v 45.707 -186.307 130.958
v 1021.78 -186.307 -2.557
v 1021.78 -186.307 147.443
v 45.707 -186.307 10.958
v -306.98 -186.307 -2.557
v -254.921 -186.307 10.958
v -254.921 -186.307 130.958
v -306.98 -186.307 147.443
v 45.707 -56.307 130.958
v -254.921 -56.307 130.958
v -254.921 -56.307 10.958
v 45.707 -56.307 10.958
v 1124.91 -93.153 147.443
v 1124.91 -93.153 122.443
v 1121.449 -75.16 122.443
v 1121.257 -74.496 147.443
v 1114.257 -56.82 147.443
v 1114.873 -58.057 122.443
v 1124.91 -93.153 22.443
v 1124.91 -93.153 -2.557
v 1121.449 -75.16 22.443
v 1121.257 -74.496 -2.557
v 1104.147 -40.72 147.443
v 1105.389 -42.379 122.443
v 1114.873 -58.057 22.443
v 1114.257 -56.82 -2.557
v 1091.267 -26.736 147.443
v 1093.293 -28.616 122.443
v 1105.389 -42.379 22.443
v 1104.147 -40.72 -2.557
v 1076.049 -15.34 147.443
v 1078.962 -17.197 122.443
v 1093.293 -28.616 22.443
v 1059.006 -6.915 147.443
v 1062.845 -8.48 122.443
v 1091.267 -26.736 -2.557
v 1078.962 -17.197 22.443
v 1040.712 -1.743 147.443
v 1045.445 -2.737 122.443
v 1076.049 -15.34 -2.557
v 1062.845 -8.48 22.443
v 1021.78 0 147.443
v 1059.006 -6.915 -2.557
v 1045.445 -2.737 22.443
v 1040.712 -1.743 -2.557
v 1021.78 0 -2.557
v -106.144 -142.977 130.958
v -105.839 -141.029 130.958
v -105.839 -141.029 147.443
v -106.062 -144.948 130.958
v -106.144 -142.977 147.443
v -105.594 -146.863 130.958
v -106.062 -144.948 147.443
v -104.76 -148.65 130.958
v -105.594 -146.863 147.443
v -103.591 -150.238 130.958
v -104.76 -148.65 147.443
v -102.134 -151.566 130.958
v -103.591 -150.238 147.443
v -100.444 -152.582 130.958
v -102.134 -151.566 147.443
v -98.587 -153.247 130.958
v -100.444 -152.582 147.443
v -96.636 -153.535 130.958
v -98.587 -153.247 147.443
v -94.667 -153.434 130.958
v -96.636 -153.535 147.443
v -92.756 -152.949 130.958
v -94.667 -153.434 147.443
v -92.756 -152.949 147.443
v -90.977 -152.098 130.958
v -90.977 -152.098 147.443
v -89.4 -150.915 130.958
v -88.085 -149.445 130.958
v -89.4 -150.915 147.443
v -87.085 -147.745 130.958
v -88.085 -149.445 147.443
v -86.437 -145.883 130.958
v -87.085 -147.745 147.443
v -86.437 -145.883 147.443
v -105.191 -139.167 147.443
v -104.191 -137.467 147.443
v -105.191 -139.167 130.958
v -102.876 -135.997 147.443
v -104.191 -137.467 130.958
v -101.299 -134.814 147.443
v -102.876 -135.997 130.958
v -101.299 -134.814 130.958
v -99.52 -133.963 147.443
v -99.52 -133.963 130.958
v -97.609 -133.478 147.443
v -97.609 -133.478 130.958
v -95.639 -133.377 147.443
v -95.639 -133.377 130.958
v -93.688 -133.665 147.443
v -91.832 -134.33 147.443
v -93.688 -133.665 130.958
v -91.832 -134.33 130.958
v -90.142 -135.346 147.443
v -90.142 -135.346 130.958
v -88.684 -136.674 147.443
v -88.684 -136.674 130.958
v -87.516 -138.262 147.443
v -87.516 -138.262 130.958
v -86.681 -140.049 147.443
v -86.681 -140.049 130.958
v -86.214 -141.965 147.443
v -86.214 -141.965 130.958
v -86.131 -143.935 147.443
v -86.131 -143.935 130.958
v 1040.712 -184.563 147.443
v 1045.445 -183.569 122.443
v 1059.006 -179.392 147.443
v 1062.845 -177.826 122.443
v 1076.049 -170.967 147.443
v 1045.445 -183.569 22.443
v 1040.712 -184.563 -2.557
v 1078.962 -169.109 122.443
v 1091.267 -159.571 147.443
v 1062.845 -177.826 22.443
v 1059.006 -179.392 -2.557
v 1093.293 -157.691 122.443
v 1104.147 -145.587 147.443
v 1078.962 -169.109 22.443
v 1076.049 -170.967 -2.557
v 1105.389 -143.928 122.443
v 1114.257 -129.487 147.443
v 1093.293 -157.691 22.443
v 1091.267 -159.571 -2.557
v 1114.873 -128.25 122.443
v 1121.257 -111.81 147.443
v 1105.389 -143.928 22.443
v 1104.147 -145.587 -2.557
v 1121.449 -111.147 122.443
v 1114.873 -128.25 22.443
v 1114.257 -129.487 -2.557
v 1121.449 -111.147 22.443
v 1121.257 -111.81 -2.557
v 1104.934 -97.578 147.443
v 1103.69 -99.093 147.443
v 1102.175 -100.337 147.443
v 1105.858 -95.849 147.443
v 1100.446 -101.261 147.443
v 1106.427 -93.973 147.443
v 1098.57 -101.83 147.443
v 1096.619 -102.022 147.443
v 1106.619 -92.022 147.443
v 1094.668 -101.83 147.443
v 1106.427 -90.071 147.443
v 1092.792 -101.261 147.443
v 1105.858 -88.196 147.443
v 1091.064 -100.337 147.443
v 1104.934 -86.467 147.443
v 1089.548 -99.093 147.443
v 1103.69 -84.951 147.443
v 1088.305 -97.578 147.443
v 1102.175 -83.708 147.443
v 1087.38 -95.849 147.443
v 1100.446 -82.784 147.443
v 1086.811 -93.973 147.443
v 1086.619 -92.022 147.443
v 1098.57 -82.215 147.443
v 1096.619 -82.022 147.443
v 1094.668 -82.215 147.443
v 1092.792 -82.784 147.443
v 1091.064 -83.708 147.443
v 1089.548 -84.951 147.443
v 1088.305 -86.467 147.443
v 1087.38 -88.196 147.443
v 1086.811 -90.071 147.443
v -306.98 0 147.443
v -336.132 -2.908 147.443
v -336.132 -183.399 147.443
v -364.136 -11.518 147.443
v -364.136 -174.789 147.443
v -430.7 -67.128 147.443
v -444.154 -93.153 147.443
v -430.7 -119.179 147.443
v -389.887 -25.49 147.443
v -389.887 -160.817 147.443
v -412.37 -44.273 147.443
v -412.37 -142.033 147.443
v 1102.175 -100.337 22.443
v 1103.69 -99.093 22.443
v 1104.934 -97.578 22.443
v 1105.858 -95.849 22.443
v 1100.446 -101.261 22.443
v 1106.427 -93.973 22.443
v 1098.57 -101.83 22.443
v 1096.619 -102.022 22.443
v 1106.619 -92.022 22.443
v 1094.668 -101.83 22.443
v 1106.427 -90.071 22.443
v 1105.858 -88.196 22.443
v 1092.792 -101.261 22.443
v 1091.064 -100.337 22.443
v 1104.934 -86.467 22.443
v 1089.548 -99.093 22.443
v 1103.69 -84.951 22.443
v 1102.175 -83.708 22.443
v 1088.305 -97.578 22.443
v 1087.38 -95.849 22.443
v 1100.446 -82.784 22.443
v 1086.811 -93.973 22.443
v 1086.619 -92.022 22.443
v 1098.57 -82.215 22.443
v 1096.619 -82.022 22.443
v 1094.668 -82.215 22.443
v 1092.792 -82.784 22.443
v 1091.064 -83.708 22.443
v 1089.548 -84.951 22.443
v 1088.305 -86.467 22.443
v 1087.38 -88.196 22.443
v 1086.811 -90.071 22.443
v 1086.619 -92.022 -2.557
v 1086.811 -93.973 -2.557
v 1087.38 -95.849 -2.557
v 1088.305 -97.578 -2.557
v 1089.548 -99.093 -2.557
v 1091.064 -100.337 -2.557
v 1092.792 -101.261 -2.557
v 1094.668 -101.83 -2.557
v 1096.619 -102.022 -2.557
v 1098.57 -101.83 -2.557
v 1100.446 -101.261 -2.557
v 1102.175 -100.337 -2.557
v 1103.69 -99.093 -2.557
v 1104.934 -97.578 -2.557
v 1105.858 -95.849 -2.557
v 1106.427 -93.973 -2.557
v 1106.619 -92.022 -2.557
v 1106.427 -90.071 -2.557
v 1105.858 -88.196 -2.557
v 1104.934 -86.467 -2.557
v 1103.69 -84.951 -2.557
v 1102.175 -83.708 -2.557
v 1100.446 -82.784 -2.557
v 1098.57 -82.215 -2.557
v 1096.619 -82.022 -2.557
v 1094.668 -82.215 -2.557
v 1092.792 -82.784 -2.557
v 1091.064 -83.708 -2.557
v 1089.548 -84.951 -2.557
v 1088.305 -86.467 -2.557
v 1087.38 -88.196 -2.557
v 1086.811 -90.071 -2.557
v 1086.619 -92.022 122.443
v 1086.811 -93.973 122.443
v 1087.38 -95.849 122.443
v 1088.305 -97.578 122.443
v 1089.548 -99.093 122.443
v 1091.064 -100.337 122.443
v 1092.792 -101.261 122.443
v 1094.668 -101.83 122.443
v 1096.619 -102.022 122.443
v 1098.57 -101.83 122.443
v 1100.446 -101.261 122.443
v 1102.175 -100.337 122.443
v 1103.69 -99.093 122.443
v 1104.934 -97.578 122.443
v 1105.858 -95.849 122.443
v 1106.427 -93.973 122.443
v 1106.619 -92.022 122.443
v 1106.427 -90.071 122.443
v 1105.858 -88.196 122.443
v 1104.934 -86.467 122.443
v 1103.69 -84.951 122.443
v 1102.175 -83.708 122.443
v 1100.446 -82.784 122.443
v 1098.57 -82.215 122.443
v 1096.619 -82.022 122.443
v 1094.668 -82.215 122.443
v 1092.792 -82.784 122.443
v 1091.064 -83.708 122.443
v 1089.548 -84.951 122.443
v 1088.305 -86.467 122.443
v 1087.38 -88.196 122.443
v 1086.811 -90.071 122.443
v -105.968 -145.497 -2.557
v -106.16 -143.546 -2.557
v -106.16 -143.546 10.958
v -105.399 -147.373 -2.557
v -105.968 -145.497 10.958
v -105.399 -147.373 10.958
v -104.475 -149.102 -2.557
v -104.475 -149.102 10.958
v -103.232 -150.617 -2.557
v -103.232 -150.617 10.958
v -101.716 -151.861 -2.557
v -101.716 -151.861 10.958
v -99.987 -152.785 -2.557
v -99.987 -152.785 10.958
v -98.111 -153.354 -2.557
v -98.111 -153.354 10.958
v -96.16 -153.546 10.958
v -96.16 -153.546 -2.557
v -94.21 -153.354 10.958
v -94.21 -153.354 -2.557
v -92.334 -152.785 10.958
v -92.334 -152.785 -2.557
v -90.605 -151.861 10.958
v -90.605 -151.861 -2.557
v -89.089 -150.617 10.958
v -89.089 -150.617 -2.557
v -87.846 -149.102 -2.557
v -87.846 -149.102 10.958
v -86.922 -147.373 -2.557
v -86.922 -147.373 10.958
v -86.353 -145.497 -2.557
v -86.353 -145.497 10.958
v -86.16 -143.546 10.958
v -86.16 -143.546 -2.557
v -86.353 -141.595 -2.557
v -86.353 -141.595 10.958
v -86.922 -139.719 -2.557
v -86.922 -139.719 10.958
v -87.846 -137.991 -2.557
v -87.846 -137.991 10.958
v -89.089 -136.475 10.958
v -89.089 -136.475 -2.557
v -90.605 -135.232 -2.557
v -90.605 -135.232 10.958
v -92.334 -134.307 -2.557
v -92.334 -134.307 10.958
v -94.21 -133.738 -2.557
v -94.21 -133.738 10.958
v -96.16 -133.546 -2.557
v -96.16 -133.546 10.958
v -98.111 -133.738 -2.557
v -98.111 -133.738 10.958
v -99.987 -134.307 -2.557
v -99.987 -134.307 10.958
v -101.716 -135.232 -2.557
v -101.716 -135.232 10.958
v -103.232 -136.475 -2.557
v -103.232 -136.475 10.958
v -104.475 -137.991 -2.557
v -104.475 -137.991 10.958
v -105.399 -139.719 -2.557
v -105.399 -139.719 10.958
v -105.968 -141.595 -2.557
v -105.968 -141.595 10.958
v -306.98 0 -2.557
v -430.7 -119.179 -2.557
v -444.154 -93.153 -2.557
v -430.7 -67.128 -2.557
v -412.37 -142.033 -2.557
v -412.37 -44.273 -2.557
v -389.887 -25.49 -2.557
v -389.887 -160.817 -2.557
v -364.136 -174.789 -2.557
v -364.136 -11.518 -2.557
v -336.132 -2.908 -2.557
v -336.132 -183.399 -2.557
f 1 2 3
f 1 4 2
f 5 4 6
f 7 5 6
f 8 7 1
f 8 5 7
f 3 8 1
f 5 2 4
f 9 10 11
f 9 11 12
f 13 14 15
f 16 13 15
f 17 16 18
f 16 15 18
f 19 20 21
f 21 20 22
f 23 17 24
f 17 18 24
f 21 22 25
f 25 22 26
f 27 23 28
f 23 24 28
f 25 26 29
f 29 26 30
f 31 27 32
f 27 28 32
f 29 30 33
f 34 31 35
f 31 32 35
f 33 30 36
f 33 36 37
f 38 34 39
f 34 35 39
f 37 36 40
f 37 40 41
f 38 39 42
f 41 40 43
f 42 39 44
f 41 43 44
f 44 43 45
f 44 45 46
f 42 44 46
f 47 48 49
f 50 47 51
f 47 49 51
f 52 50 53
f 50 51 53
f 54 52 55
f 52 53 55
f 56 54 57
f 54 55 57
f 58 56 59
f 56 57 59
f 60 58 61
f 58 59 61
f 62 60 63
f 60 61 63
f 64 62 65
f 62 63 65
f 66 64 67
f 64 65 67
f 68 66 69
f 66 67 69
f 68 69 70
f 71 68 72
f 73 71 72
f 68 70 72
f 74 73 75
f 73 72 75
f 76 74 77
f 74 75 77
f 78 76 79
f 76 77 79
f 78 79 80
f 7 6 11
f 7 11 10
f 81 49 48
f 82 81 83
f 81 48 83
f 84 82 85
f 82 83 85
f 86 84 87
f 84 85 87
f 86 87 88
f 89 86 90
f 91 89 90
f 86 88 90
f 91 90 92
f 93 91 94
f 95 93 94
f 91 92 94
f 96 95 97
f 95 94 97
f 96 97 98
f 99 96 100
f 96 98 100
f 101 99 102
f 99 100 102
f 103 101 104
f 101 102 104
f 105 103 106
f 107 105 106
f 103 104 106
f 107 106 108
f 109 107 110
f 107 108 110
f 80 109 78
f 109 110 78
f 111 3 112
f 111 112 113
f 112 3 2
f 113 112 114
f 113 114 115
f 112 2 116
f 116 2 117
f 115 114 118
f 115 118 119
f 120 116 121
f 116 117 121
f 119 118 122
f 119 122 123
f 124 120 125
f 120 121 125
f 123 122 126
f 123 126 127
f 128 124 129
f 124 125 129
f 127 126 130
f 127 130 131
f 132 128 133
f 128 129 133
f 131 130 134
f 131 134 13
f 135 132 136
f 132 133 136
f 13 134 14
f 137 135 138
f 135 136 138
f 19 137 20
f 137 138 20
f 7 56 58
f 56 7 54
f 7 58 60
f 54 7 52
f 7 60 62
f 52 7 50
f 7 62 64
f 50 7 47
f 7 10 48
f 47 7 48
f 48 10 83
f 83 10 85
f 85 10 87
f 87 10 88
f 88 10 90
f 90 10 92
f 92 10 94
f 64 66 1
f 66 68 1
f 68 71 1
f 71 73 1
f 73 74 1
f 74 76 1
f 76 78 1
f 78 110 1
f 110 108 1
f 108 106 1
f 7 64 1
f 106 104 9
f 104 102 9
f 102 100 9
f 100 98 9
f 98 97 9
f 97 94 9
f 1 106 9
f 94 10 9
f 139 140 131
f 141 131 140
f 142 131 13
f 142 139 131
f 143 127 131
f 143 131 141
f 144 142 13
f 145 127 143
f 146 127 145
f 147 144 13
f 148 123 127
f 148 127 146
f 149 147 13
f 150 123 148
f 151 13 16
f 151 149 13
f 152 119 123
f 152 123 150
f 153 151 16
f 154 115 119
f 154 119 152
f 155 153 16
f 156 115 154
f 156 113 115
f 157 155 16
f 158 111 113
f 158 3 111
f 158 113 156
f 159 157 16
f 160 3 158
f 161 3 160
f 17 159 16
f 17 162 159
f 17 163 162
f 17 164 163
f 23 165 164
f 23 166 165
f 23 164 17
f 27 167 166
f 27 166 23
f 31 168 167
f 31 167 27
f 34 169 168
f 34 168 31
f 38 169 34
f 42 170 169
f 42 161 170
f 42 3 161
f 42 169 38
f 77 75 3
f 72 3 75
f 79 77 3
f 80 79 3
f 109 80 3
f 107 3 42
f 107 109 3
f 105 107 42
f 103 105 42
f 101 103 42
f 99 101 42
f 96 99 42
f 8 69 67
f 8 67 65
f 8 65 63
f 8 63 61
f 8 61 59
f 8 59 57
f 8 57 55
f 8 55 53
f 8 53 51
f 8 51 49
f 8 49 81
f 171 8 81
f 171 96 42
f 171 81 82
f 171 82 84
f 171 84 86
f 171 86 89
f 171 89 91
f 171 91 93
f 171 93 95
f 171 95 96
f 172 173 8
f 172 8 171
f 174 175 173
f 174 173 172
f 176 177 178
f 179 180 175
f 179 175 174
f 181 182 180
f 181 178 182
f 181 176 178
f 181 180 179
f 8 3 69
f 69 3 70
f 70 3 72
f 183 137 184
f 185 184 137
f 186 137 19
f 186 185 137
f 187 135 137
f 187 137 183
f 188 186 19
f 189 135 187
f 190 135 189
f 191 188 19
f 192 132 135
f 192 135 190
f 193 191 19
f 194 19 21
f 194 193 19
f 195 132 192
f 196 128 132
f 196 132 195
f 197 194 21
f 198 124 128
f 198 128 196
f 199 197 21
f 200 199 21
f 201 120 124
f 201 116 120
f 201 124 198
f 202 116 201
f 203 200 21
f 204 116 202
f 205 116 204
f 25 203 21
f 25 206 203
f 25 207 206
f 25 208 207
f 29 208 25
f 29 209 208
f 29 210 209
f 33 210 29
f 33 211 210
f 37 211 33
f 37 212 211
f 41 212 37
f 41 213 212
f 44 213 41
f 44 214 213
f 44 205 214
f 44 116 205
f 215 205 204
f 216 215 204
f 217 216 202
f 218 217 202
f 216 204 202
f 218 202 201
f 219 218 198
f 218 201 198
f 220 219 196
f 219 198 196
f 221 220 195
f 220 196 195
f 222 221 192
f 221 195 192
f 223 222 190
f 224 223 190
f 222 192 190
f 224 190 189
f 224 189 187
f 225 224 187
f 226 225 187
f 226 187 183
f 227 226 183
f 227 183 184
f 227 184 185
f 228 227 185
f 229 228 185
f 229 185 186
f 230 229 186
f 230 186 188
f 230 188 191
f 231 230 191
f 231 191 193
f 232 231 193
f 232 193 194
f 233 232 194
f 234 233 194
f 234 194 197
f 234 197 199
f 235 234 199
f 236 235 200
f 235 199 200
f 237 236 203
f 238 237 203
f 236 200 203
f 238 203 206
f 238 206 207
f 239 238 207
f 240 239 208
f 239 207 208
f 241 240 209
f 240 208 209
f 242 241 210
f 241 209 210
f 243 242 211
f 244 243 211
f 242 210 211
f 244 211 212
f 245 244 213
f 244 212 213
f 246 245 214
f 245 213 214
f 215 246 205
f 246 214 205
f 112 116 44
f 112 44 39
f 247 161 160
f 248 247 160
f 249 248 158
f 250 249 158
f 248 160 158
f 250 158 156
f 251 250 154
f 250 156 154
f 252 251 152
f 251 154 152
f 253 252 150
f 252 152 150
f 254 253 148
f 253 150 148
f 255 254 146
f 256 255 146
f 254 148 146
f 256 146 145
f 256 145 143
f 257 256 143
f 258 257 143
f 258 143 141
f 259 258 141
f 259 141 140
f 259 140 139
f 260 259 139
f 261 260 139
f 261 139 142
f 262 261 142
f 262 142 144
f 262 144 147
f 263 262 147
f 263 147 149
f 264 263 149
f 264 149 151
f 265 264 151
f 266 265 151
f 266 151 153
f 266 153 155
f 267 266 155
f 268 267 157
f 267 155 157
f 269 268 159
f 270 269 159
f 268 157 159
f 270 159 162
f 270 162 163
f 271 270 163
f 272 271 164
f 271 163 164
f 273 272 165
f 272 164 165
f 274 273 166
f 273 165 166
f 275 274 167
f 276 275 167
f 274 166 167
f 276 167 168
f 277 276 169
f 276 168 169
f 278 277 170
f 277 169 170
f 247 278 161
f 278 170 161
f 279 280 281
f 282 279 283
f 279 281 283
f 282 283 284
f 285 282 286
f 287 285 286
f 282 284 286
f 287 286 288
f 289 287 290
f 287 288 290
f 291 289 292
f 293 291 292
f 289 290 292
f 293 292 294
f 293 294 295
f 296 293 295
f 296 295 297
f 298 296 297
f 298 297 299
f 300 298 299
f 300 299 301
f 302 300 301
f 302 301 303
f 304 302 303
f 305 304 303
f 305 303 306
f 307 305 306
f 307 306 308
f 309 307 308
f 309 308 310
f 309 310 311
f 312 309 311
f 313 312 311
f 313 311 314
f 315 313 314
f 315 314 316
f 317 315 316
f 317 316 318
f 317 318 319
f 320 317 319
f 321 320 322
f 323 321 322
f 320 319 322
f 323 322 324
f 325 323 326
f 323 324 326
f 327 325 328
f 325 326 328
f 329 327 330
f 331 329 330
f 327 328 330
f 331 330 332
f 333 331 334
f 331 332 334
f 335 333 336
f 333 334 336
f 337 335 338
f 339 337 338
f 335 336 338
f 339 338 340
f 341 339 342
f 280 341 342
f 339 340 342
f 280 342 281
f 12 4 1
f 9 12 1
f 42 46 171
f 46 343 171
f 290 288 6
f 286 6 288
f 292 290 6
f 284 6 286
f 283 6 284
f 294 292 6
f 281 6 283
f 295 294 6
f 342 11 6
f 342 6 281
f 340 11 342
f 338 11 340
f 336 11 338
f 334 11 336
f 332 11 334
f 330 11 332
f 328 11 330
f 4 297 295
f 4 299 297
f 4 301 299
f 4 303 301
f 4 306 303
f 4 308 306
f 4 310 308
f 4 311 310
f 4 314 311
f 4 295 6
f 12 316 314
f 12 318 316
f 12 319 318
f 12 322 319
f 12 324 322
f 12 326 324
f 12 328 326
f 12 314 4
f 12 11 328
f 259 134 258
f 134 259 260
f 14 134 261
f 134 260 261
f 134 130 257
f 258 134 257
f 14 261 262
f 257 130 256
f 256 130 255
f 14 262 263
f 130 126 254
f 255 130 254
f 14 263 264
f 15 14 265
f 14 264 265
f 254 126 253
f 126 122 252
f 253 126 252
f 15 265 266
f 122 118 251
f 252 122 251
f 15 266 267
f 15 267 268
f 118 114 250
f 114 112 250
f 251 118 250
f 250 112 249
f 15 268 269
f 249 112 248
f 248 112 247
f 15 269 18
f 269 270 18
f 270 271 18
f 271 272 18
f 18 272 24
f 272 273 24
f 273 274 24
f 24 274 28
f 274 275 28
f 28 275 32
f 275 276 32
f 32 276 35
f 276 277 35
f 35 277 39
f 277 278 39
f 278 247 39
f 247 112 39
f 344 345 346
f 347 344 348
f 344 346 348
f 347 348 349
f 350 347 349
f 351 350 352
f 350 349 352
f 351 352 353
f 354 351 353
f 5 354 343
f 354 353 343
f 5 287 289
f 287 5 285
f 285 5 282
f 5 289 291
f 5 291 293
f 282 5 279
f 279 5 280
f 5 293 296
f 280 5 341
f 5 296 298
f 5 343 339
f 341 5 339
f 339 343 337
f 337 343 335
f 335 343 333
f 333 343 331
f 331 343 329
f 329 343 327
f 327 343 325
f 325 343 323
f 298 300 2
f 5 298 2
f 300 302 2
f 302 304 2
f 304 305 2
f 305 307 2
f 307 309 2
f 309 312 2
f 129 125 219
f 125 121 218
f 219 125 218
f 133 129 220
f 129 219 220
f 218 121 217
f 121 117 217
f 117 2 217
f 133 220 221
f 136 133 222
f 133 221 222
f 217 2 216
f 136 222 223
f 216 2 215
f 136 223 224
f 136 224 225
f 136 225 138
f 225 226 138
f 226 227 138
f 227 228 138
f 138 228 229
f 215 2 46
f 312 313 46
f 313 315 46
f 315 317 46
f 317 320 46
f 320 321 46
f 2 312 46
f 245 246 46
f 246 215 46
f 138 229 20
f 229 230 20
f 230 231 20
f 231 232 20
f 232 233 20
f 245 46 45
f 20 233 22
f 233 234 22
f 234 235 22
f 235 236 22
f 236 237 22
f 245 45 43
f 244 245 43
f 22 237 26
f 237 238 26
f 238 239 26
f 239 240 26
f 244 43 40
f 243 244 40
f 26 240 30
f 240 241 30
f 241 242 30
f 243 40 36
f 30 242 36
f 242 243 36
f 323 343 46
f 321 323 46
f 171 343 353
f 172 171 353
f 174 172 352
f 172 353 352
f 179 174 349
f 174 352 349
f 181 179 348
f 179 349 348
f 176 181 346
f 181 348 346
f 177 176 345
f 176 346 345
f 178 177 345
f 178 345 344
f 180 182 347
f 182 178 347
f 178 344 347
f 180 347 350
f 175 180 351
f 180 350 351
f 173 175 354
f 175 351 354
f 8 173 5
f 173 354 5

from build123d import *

# Parameters (mm, degrees)
F0_W         = 1500
F0_H         = 150
F1_DEPTH     = 56.30659
F2_W         = 1500
F2_H         = 150
F2_W_2       = 300.6279
F2_H_2       = 120
F3_DEPTH     = 130
F6_D         = 20
F6_DEPTH     = 16.486247664
F7_D         = 20
F8_T1_DEPTH  = 887.8761290407
F9_W         = 186.30659
F9_H         = 25
F10_DEPTH    = 80
F11_T1_DEPTH = 543.3223571193
F11_T3_DEPTH = 543.3223571193
F13_D        = 20


# Not quite as in the source:
# - a fillet or chamfer that OpenCascade refuses, or shapes differently, is made with other operations: its cross-section is extruded or revolved along the edge and cut away or added
# - a feature names something its author has since deleted; it is built from what else it names


with BuildPart() as f1:
    # F0 (on Front) → F1 (new body)
    with BuildSketch(Plane.XZ):
        with Locations((295.444762387, 72.4433880299)):
            Rectangle(F0_W, F0_H)
    extrude(amount=F1_DEPTH)

    # F2 (on face) → F3 (join)
    with BuildSketch(Plane.XZ.offset(56.30659)):
        with Locations((295.444762387, 72.4433880299)):
            Rectangle(F2_W, F2_H)
        with Locations((-104.6067848625, 70.9581403659)):
            Rectangle(F2_W_2, F2_H_2, mode=Mode.SUBTRACT)
    extrude(amount=F3_DEPTH)

    # F6 (through all, one way)
    with BuildSketch(Plane(origin=(0, 0, 130.9581403659), x_dir=(1, 0, 0), z_dir=(0, 0, -1))):
        with Locations((-96.1152985692, 143.3657854795)):
            Circle(F6_D / 2)
    extrude(amount=-F6_DEPTH, mode=Mode.SUBTRACT)

    # F7 (through all)
    with Locations(Plane(origin=(0, 0, -2.5566119701), x_dir=(1, 0, 0), z_dir=(0, 0, -1))):
        with Locations((-96.1604490876, 143.5462683439)):
            Hole(F7_D / 2)

    # F8: fillet of radius 147.5752258081 on 2 edges, made by hand

    # F8_s2 → F8_t1 (cut)
    with BuildSketch(Plane.XY.offset(-371.4946764904)):
        with BuildLine():
            ThreePointArc((-454.555237613, -38.7313641919), (-411.331454709, -143.0828070959), (-306.9800118049, -186.30659))
            Line((-306.9800118049, -186.30659), (-454.555237613, -186.30659))
            Line((-454.555237613, -186.30659), (-454.555237613, -38.7313641919))
        make_face()
        with BuildLine():
            ThreePointArc((-306.9800118049, 0), (-411.331454709, -43.2237829041), (-454.555237613, -147.5752258081))
            Line((-454.555237613, -147.5752258081), (-454.555237613, 0))
            Line((-454.555237613, 0), (-306.9800118049, 0))
        make_face()
    extrude(amount=F8_T1_DEPTH, mode=Mode.SUBTRACT)

    # F9 (on face) → F10 (join)
    with BuildSketch(Plane.YZ.offset(1045.444762387)):
        with Locations((-93.153295, 134.9433880299)):
            Rectangle(F9_W, F9_H)
        with Locations((-93.153295, 9.9433880299)):
            Rectangle(F9_W, F9_H)
    extrude(amount=F10_DEPTH)

    # F11: fillet of radius 103.6644714239 on 4 edges, made by hand

    # F11_s2 → F11_t1 (cut)
    with BuildSketch(Plane.XY.offset(-136.7177905297)):
        with BuildLine():
            ThreePointArc((1125.444762387, -103.6644714239), (1095.082141675, -30.3626207119), (1021.7802909631, 0))
            Line((1021.7802909631, 0), (1125.444762387, 0))
            Line((1125.444762387, 0), (1125.444762387, -103.6644714239))
        make_face()
        with BuildLine():
            ThreePointArc((1021.7802909631, -186.30659), (1095.082141675, -155.9439692881), (1125.444762387, -82.6421185761))
            Line((1125.444762387, -82.6421185761), (1125.444762387, -186.30659))
            Line((1125.444762387, -186.30659), (1021.7802909631, -186.30659))
        make_face()
    extrude(amount=F11_T1_DEPTH, mode=Mode.SUBTRACT)

    # F11_s4 → F11_t3 (cut)
    with BuildSketch(Plane.XY.offset(-261.7177905297)):
        with BuildLine():
            ThreePointArc((1125.444762387, -103.6644714239), (1095.082141675, -30.3626207119), (1021.7802909631, 0))
            Line((1021.7802909631, 0), (1125.444762387, 0))
            Line((1125.444762387, 0), (1125.444762387, -103.6644714239))
        make_face()
        with BuildLine():
            ThreePointArc((1021.7802909631, -186.30659), (1095.082141675, -155.9439692881), (1125.444762387, -82.6421185761))
            Line((1125.444762387, -82.6421185761), (1125.444762387, -186.30659))
            Line((1125.444762387, -186.30659), (1021.7802909631, -186.30659))
        make_face()
    extrude(amount=F11_T3_DEPTH, mode=Mode.SUBTRACT)

    # F13 (through all)
    with Locations(Plane(origin=(0, 0, -2.5566119701), x_dir=(1, 0, 0), z_dir=(0, 0, -1))):
        with Locations((1096.6192483902, 92.0223891735)):
            Hole(F13_D / 2)


solid = f1.part
